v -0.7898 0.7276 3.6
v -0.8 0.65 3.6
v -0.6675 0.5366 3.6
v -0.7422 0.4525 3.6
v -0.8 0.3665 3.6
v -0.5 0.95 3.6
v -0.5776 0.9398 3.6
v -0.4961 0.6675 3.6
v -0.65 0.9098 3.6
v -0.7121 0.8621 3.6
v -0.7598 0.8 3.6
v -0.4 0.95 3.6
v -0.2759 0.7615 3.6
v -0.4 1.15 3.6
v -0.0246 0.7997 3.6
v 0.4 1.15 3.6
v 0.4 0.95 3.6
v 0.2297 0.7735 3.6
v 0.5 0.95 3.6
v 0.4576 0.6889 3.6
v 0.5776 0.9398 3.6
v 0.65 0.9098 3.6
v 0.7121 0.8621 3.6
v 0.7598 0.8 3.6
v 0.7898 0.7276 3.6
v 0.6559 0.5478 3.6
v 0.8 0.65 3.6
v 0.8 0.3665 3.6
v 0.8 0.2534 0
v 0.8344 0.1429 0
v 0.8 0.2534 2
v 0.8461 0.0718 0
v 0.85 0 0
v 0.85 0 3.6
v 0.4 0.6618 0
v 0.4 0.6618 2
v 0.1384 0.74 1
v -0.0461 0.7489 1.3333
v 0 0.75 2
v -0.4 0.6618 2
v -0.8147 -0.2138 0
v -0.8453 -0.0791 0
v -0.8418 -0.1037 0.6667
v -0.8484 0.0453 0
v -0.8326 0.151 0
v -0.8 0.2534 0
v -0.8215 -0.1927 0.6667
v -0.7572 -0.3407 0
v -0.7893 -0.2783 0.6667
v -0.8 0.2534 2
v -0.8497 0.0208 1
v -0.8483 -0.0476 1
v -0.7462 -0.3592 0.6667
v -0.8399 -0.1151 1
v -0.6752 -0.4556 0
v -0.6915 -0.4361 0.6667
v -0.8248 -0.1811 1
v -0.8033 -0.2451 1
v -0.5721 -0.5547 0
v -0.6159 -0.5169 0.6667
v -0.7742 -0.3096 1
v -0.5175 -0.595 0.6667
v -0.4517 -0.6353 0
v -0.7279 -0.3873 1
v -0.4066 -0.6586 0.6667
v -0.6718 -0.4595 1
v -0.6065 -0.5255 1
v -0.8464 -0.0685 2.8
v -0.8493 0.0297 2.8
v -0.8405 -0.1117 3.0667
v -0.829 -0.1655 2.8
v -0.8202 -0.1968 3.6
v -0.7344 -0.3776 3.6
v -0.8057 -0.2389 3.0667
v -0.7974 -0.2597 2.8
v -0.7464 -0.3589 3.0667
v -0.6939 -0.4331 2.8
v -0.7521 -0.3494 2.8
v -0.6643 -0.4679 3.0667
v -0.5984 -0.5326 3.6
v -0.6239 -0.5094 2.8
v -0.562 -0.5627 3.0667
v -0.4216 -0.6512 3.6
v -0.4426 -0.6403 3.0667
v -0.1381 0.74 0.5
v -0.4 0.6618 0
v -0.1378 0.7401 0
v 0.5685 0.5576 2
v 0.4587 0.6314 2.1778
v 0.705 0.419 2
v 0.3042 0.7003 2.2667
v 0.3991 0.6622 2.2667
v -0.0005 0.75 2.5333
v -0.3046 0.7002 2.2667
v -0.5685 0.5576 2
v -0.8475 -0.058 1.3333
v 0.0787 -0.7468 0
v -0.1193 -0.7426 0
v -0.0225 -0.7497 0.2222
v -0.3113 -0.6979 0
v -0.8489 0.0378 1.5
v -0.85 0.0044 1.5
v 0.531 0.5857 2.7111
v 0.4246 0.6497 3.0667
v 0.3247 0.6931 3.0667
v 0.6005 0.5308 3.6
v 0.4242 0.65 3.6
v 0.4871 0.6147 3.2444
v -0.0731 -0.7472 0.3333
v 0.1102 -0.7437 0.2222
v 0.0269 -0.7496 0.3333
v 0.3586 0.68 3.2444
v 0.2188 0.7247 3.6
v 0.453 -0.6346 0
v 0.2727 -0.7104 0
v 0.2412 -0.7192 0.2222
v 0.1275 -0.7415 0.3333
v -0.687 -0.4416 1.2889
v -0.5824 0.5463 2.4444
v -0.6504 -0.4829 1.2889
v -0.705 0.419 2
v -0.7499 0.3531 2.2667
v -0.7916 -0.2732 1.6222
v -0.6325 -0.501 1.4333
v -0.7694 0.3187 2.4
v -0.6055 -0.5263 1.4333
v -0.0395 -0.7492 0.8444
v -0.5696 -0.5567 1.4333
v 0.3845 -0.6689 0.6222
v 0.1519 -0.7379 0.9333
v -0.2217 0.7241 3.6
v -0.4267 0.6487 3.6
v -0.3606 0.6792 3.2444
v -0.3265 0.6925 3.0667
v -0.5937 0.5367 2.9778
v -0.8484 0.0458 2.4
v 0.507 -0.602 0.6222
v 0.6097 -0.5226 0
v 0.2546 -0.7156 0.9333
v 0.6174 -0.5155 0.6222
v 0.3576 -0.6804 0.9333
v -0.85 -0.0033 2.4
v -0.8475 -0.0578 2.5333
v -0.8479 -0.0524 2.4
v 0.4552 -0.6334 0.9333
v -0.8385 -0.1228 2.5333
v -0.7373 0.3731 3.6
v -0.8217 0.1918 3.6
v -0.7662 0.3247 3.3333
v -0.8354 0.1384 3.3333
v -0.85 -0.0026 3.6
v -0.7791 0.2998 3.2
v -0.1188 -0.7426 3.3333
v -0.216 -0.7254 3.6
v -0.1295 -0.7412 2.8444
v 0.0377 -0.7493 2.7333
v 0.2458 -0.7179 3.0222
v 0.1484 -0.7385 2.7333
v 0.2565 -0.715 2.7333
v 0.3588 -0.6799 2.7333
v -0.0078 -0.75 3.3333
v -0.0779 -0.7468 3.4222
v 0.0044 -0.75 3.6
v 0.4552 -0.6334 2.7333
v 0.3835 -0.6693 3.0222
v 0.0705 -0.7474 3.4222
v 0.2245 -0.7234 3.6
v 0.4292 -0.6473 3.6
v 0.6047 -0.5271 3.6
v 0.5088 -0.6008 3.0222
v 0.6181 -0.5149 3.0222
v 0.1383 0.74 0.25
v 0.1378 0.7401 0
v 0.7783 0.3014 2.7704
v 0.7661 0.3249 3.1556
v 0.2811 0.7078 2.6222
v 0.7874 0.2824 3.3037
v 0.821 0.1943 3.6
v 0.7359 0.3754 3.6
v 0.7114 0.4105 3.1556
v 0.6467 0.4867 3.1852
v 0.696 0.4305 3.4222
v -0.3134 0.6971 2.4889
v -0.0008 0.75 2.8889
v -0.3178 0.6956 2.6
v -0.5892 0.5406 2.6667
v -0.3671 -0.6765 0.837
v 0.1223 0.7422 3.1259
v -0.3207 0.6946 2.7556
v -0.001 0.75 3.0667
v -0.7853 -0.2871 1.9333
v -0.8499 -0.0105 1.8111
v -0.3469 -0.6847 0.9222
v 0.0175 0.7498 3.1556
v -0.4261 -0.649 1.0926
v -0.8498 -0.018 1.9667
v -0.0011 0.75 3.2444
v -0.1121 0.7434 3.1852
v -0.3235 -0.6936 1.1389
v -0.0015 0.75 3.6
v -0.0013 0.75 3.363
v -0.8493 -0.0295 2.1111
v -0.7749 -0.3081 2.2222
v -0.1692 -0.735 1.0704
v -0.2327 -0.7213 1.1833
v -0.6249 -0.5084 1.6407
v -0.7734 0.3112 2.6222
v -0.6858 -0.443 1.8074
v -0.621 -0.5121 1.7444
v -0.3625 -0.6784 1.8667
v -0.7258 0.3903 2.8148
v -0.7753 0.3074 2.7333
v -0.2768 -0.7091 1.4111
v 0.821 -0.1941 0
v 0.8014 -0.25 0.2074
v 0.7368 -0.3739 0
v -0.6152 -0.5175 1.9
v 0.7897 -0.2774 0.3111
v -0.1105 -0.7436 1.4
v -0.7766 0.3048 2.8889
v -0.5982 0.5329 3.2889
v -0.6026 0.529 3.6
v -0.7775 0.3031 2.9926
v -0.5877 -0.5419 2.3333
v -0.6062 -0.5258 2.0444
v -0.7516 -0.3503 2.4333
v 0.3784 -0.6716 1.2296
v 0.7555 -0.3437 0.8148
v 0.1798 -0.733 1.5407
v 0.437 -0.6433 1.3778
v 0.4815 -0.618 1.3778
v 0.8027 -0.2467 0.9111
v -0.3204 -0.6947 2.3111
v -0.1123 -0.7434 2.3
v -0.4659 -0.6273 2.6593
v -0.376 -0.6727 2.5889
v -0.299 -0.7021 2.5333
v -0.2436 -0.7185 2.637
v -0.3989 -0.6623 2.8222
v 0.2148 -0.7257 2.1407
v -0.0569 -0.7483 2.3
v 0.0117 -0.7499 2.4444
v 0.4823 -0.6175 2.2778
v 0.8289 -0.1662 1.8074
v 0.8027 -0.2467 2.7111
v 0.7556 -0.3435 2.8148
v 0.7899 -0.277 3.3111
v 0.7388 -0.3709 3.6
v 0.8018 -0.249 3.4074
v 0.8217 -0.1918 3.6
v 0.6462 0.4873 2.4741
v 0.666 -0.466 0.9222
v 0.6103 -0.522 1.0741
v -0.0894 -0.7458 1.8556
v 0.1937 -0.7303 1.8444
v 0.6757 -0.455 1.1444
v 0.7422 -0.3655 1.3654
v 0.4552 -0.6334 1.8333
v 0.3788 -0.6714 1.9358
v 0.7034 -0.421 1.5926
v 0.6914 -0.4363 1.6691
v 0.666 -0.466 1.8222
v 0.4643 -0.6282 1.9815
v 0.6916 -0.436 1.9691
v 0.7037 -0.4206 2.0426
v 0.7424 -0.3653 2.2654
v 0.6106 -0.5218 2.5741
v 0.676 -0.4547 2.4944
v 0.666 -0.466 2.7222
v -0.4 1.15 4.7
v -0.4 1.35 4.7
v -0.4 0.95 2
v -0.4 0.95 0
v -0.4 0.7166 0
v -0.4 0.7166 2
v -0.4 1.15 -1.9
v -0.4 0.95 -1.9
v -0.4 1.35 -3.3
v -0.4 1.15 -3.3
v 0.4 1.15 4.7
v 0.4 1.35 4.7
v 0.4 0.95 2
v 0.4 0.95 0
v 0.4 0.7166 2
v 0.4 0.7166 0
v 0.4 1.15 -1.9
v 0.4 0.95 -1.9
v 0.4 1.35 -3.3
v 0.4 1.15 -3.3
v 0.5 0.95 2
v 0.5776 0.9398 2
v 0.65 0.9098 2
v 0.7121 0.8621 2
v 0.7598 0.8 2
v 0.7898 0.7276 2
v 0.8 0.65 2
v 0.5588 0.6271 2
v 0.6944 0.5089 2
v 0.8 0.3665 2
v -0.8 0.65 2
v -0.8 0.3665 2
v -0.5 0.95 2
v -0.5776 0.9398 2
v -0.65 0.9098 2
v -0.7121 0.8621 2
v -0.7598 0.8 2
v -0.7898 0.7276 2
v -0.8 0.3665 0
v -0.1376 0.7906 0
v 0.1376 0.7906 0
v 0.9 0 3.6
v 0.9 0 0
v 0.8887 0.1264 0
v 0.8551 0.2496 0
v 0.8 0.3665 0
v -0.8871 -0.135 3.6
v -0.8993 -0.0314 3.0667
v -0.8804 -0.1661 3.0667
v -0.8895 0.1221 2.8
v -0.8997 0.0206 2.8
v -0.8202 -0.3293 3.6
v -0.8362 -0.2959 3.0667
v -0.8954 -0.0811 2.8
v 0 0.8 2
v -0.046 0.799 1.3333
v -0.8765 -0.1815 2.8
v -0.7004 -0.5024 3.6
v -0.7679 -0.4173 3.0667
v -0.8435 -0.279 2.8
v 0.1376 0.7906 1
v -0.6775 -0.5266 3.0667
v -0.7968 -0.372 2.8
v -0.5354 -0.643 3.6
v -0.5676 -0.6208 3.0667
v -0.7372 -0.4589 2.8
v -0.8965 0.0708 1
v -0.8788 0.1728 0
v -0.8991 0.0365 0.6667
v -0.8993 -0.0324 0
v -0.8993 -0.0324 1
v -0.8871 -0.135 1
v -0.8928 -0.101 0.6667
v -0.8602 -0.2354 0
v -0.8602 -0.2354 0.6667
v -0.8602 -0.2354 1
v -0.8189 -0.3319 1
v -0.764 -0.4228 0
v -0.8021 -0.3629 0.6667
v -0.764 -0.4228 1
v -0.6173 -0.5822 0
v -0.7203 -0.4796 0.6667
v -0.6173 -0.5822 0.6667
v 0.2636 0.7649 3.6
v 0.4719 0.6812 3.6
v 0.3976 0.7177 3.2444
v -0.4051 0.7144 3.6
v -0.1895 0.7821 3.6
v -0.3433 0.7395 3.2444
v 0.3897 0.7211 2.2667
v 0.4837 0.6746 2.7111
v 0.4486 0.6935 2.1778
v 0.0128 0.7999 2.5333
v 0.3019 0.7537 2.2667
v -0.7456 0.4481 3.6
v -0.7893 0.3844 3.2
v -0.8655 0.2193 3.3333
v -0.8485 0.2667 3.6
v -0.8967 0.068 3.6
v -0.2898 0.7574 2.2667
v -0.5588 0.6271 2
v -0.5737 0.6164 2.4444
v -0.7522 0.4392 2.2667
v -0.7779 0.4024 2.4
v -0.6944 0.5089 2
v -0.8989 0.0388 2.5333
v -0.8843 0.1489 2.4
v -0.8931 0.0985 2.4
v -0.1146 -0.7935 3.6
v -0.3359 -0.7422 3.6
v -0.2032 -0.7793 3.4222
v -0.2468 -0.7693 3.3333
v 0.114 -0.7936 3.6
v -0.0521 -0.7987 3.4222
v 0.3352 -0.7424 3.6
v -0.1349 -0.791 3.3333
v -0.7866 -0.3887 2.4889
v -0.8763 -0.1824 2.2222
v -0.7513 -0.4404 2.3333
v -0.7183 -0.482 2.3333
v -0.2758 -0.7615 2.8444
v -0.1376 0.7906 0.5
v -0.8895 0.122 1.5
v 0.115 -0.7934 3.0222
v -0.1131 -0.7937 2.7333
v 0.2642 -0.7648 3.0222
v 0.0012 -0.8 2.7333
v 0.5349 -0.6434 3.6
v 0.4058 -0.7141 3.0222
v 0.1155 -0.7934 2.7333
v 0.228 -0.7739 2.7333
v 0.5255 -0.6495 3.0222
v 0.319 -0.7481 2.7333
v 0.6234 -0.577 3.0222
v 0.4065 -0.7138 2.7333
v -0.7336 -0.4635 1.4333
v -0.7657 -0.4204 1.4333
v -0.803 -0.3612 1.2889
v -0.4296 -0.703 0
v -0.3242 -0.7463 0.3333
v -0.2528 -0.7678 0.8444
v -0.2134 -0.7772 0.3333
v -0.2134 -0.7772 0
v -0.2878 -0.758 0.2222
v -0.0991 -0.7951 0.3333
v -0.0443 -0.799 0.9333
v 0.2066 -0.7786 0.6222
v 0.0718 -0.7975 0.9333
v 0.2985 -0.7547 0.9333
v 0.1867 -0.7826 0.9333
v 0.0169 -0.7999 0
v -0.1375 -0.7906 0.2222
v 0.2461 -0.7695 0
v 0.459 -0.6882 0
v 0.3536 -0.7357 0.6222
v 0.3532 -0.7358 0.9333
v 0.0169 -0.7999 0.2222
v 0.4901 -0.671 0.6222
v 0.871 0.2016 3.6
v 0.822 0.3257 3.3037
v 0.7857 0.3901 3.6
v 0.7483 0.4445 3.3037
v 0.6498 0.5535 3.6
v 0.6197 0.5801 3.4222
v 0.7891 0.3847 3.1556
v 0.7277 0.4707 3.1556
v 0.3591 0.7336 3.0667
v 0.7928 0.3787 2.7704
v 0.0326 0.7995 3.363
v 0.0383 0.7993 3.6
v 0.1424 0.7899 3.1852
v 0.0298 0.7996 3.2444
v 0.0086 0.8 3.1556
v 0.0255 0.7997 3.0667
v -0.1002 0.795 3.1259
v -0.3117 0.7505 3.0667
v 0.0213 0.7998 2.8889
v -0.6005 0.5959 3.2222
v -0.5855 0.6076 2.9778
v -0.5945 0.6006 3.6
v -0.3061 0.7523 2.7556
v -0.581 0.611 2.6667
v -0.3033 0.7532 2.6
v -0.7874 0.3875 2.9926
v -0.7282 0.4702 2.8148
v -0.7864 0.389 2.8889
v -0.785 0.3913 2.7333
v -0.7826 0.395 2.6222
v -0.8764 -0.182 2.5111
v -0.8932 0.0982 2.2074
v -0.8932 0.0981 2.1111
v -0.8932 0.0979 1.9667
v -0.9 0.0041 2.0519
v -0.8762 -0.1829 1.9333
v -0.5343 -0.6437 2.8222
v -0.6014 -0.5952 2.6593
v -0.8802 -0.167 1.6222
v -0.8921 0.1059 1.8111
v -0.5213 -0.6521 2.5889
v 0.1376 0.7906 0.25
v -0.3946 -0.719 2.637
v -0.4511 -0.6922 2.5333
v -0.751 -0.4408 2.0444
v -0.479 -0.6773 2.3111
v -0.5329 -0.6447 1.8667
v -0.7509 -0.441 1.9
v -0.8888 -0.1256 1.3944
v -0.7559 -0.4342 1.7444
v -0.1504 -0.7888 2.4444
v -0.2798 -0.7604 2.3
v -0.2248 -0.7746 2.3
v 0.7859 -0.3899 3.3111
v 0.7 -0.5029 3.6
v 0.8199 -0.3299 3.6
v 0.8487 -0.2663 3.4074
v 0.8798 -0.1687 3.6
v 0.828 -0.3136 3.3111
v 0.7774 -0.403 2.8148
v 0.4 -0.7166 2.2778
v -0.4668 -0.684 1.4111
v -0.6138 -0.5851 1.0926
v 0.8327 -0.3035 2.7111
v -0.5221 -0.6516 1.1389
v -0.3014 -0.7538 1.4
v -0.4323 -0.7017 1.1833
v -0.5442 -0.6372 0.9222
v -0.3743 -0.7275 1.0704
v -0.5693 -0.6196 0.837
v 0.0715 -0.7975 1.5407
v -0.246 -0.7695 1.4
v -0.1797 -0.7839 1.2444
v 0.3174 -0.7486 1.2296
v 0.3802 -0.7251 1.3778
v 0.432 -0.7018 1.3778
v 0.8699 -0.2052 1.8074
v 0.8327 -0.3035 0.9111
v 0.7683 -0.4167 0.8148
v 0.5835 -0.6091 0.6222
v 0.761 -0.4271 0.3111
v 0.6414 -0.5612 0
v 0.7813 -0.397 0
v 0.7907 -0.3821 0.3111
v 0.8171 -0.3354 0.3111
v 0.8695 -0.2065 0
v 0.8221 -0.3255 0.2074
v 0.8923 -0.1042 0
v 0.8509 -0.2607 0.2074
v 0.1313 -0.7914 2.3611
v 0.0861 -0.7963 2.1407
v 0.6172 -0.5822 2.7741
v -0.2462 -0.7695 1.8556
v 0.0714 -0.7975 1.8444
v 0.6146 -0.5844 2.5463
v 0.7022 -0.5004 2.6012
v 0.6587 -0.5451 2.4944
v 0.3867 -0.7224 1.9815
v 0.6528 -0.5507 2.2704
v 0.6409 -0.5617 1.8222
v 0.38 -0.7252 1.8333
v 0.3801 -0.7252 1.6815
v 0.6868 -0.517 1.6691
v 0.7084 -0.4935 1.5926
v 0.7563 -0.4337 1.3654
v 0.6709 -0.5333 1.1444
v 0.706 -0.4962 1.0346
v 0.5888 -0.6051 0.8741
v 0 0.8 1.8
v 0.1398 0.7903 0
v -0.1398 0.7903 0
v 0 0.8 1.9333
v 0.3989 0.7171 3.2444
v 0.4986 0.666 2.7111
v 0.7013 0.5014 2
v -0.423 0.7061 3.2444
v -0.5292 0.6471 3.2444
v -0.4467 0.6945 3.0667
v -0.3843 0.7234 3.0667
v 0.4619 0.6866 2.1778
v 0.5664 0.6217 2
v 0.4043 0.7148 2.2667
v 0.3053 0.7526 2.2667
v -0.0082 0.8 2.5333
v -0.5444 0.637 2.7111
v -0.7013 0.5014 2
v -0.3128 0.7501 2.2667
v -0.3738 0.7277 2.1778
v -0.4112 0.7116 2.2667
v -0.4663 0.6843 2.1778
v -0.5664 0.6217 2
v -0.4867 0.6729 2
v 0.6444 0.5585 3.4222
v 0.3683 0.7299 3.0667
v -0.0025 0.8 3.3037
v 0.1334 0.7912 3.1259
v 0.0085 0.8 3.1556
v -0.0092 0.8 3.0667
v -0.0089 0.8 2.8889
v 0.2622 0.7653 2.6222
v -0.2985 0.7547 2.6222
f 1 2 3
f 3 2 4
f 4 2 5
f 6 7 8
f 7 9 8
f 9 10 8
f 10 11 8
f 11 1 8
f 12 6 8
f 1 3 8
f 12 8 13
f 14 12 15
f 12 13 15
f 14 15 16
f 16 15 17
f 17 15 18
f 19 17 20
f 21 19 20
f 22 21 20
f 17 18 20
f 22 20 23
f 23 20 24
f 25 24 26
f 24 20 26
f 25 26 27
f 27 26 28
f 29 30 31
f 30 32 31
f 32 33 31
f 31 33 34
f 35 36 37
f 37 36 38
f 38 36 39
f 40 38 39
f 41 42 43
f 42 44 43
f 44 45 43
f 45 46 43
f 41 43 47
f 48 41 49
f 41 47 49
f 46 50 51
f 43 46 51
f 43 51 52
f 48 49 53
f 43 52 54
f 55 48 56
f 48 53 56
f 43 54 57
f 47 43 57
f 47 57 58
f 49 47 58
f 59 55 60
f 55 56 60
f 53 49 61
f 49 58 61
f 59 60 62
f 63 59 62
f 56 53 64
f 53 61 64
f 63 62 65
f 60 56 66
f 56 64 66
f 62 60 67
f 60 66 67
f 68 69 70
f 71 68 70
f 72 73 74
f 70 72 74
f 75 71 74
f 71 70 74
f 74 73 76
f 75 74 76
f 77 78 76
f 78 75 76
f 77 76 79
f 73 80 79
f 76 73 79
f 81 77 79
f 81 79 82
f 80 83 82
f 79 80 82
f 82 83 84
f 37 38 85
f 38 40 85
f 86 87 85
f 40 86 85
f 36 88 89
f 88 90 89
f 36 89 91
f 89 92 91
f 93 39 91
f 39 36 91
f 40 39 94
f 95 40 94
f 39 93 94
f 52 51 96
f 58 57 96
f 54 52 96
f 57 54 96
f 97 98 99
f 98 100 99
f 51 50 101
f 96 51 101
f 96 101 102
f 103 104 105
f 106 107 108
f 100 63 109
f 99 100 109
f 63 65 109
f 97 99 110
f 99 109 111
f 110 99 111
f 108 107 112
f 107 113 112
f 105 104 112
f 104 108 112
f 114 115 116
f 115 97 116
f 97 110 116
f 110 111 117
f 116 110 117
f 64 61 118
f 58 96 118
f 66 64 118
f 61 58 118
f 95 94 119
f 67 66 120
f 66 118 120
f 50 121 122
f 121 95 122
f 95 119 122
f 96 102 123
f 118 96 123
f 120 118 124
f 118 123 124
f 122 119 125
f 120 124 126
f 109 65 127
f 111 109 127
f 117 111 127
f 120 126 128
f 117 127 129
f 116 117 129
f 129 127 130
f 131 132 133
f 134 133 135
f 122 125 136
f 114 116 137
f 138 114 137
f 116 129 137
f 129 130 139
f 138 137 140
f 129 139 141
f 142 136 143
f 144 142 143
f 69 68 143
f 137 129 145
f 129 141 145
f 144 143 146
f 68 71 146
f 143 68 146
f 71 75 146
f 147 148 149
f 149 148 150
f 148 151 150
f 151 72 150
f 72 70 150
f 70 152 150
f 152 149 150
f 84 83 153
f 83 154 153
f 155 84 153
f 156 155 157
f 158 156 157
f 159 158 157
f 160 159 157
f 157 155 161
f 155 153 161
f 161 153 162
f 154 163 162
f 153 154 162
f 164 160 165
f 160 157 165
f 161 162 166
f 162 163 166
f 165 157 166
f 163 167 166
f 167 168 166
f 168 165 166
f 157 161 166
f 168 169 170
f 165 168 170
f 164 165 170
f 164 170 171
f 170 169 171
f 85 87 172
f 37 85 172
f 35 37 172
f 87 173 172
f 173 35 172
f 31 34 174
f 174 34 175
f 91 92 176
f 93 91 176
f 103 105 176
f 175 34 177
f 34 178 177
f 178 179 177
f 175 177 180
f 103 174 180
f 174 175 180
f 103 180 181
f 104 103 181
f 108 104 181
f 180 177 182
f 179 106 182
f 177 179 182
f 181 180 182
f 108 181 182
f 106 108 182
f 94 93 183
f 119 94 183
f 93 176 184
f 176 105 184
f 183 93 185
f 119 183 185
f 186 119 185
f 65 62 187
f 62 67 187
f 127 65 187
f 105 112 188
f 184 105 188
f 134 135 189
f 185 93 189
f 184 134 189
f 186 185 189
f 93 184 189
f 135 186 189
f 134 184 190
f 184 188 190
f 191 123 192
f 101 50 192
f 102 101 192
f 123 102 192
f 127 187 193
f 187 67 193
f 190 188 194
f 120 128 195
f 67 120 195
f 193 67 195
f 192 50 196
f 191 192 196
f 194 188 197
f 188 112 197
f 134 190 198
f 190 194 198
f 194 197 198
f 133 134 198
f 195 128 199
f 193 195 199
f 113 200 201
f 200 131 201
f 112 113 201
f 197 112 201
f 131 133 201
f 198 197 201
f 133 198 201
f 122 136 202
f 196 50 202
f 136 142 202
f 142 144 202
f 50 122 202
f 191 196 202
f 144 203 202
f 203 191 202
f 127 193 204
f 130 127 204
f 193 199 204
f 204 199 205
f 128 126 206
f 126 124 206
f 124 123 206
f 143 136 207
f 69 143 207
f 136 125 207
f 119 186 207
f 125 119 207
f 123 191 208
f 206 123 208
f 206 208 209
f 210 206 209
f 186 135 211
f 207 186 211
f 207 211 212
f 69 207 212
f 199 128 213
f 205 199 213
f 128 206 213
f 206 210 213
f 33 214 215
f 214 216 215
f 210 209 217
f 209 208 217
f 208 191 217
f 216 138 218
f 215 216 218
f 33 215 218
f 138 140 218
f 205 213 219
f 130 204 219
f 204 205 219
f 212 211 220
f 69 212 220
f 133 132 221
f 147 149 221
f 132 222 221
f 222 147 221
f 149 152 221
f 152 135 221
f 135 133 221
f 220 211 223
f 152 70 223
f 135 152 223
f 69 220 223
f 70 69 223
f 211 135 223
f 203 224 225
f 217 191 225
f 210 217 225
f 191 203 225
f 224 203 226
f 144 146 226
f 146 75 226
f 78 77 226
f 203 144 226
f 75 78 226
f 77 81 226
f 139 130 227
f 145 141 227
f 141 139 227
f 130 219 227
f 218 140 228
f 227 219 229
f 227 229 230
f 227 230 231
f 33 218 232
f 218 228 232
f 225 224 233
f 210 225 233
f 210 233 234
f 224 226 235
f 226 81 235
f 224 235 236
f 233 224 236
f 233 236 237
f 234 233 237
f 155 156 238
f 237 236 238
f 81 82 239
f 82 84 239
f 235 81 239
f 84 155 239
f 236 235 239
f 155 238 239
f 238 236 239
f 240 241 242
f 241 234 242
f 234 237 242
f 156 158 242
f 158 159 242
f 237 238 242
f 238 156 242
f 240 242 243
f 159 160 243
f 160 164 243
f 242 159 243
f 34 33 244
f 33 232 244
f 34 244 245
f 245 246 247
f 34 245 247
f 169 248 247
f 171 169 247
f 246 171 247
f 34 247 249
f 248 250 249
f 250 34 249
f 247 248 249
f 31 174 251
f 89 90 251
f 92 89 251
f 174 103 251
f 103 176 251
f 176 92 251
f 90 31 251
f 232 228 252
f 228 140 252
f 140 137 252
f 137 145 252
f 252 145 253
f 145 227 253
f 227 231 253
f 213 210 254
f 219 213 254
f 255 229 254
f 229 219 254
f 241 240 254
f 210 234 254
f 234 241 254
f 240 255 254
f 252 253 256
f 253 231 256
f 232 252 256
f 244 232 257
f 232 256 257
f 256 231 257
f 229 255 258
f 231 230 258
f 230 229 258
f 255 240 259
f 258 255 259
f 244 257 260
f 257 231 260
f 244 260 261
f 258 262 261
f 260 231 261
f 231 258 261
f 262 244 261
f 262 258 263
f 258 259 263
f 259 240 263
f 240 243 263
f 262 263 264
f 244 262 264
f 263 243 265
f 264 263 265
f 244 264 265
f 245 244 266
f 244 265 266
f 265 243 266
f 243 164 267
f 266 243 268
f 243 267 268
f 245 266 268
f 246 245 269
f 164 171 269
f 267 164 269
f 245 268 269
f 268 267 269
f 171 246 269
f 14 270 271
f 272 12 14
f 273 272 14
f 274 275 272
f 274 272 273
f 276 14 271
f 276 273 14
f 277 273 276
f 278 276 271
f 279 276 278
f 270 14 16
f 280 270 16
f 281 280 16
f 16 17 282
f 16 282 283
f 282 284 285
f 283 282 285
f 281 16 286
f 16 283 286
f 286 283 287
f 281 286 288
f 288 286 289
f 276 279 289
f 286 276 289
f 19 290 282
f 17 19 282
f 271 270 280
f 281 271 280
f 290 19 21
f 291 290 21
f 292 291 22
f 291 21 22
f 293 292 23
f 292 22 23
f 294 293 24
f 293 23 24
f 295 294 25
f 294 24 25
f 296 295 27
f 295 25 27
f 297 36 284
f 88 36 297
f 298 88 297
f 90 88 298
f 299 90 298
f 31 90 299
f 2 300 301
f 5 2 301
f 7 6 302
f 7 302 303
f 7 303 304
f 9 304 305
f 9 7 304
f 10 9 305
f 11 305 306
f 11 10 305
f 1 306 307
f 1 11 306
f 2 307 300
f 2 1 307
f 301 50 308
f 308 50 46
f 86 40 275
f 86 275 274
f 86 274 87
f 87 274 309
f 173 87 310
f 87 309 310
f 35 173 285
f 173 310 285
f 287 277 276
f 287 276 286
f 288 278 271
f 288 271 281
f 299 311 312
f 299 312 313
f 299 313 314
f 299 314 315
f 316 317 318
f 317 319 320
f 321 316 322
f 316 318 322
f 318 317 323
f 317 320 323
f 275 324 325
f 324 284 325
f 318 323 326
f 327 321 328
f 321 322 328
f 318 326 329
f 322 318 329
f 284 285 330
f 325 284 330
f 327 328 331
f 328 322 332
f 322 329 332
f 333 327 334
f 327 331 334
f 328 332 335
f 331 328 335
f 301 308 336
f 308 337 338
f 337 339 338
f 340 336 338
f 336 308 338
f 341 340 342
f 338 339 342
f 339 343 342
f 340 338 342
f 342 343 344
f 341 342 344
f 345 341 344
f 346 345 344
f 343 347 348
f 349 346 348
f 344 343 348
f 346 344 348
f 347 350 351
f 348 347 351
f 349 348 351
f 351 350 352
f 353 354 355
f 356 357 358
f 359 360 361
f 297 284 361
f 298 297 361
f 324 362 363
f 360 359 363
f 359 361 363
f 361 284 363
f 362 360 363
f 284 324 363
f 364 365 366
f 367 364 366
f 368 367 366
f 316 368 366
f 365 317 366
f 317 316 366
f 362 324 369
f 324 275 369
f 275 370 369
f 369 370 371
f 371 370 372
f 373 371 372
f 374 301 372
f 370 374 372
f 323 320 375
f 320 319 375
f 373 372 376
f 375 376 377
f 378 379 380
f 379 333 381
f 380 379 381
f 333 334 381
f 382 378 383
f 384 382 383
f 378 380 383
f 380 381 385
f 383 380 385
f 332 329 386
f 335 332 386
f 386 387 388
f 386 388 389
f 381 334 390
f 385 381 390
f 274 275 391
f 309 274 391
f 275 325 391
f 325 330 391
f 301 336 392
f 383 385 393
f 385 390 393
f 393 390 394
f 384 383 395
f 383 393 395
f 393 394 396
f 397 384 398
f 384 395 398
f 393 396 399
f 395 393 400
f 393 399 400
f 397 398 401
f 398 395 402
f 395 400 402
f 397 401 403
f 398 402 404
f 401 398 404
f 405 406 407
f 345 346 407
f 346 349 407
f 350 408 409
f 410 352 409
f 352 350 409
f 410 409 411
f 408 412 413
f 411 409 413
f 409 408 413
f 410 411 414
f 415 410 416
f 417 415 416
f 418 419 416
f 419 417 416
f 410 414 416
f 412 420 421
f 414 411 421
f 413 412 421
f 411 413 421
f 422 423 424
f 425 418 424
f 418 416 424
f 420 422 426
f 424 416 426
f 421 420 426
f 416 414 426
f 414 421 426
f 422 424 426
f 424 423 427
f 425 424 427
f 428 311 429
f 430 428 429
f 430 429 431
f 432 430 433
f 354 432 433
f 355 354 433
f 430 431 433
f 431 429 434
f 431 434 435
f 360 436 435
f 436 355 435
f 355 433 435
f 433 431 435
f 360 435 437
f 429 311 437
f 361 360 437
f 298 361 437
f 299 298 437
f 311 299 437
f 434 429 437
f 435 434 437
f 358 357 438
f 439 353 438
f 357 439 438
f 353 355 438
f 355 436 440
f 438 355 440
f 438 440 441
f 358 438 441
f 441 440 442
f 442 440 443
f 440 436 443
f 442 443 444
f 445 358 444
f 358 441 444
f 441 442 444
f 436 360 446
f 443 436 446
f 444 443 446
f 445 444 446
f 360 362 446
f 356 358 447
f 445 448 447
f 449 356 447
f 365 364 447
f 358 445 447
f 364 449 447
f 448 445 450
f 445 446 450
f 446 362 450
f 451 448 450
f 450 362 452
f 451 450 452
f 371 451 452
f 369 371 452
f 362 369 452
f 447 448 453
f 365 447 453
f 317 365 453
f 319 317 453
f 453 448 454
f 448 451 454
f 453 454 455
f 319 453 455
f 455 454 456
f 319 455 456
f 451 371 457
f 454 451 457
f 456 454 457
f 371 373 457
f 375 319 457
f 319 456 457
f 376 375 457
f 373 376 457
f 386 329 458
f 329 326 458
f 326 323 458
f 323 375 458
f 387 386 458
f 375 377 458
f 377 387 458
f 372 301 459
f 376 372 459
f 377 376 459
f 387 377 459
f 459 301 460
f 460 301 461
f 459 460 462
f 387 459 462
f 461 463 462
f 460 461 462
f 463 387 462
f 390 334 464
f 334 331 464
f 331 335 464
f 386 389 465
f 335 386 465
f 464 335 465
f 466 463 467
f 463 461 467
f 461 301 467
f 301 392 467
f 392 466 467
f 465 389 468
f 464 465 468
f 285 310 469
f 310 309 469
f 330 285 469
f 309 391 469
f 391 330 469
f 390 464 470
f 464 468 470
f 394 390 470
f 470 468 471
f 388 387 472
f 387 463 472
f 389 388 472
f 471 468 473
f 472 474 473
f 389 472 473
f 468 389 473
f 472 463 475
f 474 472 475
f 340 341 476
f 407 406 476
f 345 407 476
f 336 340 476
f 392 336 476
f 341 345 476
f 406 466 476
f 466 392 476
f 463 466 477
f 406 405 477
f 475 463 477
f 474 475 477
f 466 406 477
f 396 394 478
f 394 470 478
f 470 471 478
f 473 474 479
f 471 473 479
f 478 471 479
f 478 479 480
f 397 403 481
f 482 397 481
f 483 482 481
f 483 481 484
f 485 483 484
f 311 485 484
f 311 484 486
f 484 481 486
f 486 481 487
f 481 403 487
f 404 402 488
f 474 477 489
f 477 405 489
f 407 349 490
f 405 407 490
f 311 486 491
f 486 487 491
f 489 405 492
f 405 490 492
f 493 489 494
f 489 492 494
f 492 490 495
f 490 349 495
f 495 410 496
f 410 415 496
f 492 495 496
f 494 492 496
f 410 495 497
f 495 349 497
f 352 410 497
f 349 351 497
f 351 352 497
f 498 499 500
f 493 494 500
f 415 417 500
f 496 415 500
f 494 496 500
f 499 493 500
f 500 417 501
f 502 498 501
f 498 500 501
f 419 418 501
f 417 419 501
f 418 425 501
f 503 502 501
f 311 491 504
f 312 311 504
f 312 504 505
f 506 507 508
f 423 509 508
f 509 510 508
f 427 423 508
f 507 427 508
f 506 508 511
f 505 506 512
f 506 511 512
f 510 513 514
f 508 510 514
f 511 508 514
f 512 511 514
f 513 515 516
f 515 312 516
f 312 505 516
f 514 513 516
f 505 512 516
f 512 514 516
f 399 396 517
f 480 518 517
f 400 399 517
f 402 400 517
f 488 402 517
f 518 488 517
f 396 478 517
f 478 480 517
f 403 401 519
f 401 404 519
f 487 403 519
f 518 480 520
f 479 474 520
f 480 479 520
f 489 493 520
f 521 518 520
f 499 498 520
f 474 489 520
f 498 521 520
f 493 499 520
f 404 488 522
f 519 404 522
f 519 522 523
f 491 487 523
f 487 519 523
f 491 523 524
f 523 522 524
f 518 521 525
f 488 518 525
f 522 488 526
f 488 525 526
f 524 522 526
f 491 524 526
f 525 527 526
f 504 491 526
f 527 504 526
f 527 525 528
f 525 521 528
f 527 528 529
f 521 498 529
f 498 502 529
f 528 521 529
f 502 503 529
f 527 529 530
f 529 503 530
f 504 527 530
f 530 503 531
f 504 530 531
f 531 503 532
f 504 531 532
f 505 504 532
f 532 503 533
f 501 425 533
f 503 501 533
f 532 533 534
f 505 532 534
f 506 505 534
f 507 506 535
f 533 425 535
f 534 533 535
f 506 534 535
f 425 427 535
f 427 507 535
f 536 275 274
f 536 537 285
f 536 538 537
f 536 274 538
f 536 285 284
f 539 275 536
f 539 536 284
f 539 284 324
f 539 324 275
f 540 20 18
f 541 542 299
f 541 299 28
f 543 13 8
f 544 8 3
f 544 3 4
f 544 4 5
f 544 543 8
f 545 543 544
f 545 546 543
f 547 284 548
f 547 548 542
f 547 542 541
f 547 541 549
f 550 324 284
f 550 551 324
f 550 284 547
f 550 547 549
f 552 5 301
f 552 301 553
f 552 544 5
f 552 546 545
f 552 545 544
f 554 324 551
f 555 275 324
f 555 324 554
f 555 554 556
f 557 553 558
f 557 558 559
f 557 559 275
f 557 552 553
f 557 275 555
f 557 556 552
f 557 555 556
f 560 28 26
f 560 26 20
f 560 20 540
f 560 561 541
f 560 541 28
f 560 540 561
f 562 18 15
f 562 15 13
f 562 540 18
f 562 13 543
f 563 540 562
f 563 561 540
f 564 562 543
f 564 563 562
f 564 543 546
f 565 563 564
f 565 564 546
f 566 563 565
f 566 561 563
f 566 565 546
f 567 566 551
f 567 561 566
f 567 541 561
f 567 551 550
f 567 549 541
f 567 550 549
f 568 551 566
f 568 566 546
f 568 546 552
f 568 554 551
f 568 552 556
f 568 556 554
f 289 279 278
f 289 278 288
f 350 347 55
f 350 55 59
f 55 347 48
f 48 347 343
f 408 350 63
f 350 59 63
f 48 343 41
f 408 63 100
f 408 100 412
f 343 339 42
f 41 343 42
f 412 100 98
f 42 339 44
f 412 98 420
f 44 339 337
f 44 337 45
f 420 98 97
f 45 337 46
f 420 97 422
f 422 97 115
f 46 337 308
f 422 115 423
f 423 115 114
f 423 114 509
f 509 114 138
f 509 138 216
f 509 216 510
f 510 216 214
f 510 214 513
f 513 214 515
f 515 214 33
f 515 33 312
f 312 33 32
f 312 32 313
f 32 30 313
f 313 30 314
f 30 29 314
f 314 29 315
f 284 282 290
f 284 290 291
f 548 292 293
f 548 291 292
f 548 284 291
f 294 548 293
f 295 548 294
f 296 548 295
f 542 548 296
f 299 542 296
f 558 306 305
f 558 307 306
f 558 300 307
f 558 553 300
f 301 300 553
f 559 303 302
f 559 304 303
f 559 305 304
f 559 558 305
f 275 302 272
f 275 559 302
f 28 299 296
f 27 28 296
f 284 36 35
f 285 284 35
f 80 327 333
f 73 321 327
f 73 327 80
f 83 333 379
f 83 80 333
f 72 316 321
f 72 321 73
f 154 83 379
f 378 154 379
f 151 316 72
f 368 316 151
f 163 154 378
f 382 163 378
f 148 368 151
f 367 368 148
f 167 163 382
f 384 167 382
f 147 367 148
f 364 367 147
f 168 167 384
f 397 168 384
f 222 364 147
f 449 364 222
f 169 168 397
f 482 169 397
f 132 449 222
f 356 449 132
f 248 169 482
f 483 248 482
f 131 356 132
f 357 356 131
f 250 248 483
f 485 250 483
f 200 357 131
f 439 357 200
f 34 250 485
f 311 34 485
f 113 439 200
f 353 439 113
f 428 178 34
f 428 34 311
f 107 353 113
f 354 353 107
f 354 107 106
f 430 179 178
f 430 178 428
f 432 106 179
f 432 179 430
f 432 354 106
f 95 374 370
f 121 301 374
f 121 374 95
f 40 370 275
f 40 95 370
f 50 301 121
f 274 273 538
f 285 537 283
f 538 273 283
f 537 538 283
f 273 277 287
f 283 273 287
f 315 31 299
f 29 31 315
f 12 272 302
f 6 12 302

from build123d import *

# Parameters (mm, degrees)
SKETCH1_RX          = 0.9
SKETCH1_RY          = 0.8
BOSS_EXTRUDE1_DEPTH = 3.6
CUT_EXTRUDE2_REACH  = 5.796
SKETCH2_RX          = 0.85
SKETCH2_RY          = 0.75
BOSS_EXTRUDE3_DEPTH = 3.6
SKETCH3_W           = 0.8
SKETCH3_H           = 5.5
BOSS_EXTRUDE4_DEPTH = 0.2
SKETCH4_W           = 0.8
SKETCH4_H           = 8
BOSS_EXTRUDE5_DEPTH = 0.2
FILLET2_R           = 0.3
CUT_EXTRUDE4_START  = -0.696564
SKETCH5_W           = 0.4
SKETCH5_H           = 2
CUT_EXTRUDE4_DEPTH  = 0.696564


# Read off the part's stored shape, not the designer's step: Boss-Extrude3
with BuildPart() as part:
    # Sketch1 → Boss-Extrude1 (new body)
    with BuildSketch(Plane.XY):
        with Locations((0, 0)):
            Ellipse(SKETCH1_RX, SKETCH1_RY)
    extrude(amount=BOSS_EXTRUDE1_DEPTH)

    # Sketch2 → Cut-Extrude2 (cut, up to next)
    with BuildSketch(Plane.XY.offset(3.6), mode=Mode.PRIVATE) as cut_extrude2_sk1:
        with Locations((0, 0)):
            Ellipse(SKETCH2_RX, SKETCH2_RY)
    cut_extrude2_tool1 = extrude(cut_extrude2_sk1.sketch, amount=-CUT_EXTRUDE2_REACH, mode=Mode.PRIVATE) & part.part
    add(cut_extrude2_tool1.solids().sort_by_distance((0, 0, 3.6))[0], mode=Mode.SUBTRACT)


with BuildPart() as body_2:
    # Boss-Extrude3 outline → Boss-Extrude3 (new body)
    with BuildSketch(Plane.XY):
        with BuildLine():
            Line((0.8, 0.366498278), (0.8, 0.95))
            Line((0.8, 0.95), (-0.8, 0.95))
            Line((-0.8, 0.95), (-0.8, 0.366498278))
            add(Edge.make_bspline(
                [(0.8, 0.366498278), (0, 1.7462565), (-0.8, 0.366498278)],
                knots=[0.47588225, 0.47588225, 0.47588225, 2.665710404, 2.665710404, 2.665710404], degree=2, weights=[1, 0.458122847, 1]))
        make_face()
    extrude(amount=BOSS_EXTRUDE3_DEPTH)

    # Sketch3 → Boss-Extrude4 (add)
    with BuildSketch(Plane(origin=(0, 0.95, 0), x_dir=(1, 0, 0), z_dir=(0, 1, 0))):
        with Locations((0, -0.85)):
            Rectangle(SKETCH3_W, SKETCH3_H)
    extrude(amount=BOSS_EXTRUDE4_DEPTH)

    # Sketch4 → Boss-Extrude5 (add)
    with BuildSketch(Plane(origin=(0, 1.15, 0), x_dir=(1, 0, 0), z_dir=(0, 1, 0))):
        with Locations((0, -0.7)):
            Rectangle(SKETCH4_W, SKETCH4_H)
    extrude(amount=BOSS_EXTRUDE5_DEPTH)

    # Fillet2
    fillet2_edges = [body_2.edges().sort_by_distance(p)[0] for p in [
        (0.8, 0.95, 1.8),
        (-0.8, 0.95, 1.8),
    ]]
    fillet(fillet2_edges, radius=FILLET2_R)


with BuildPart() as cut_extrude4_tool:
    # Sketch5 → Cut-Extrude4 (new body)
    with BuildSketch(Plane(origin=(0, 0.95, 0), x_dir=(1, 0, 0), z_dir=(0, 1, 0)).offset(CUT_EXTRUDE4_START)):
        with Locations((-0.6, -1)):
            Rectangle(SKETCH5_W, SKETCH5_H)
        with Locations((0.6, -1)):
            Rectangle(SKETCH5_W, SKETCH5_H)
    extrude(amount=CUT_EXTRUDE4_DEPTH)


with BuildPart() as part_1:
    add(part.part)

    # Cut-Extrude4: cut by cut_extrude4_tool
    add(cut_extrude4_tool.part, mode=Mode.SUBTRACT)


with BuildPart() as body_2_1:
    add(body_2.part)

    # Cut-Extrude4: cut by cut_extrude4_tool
    add(cut_extrude4_tool.part, mode=Mode.SUBTRACT)


solid = Compound([part_1.part, body_2_1.part])
